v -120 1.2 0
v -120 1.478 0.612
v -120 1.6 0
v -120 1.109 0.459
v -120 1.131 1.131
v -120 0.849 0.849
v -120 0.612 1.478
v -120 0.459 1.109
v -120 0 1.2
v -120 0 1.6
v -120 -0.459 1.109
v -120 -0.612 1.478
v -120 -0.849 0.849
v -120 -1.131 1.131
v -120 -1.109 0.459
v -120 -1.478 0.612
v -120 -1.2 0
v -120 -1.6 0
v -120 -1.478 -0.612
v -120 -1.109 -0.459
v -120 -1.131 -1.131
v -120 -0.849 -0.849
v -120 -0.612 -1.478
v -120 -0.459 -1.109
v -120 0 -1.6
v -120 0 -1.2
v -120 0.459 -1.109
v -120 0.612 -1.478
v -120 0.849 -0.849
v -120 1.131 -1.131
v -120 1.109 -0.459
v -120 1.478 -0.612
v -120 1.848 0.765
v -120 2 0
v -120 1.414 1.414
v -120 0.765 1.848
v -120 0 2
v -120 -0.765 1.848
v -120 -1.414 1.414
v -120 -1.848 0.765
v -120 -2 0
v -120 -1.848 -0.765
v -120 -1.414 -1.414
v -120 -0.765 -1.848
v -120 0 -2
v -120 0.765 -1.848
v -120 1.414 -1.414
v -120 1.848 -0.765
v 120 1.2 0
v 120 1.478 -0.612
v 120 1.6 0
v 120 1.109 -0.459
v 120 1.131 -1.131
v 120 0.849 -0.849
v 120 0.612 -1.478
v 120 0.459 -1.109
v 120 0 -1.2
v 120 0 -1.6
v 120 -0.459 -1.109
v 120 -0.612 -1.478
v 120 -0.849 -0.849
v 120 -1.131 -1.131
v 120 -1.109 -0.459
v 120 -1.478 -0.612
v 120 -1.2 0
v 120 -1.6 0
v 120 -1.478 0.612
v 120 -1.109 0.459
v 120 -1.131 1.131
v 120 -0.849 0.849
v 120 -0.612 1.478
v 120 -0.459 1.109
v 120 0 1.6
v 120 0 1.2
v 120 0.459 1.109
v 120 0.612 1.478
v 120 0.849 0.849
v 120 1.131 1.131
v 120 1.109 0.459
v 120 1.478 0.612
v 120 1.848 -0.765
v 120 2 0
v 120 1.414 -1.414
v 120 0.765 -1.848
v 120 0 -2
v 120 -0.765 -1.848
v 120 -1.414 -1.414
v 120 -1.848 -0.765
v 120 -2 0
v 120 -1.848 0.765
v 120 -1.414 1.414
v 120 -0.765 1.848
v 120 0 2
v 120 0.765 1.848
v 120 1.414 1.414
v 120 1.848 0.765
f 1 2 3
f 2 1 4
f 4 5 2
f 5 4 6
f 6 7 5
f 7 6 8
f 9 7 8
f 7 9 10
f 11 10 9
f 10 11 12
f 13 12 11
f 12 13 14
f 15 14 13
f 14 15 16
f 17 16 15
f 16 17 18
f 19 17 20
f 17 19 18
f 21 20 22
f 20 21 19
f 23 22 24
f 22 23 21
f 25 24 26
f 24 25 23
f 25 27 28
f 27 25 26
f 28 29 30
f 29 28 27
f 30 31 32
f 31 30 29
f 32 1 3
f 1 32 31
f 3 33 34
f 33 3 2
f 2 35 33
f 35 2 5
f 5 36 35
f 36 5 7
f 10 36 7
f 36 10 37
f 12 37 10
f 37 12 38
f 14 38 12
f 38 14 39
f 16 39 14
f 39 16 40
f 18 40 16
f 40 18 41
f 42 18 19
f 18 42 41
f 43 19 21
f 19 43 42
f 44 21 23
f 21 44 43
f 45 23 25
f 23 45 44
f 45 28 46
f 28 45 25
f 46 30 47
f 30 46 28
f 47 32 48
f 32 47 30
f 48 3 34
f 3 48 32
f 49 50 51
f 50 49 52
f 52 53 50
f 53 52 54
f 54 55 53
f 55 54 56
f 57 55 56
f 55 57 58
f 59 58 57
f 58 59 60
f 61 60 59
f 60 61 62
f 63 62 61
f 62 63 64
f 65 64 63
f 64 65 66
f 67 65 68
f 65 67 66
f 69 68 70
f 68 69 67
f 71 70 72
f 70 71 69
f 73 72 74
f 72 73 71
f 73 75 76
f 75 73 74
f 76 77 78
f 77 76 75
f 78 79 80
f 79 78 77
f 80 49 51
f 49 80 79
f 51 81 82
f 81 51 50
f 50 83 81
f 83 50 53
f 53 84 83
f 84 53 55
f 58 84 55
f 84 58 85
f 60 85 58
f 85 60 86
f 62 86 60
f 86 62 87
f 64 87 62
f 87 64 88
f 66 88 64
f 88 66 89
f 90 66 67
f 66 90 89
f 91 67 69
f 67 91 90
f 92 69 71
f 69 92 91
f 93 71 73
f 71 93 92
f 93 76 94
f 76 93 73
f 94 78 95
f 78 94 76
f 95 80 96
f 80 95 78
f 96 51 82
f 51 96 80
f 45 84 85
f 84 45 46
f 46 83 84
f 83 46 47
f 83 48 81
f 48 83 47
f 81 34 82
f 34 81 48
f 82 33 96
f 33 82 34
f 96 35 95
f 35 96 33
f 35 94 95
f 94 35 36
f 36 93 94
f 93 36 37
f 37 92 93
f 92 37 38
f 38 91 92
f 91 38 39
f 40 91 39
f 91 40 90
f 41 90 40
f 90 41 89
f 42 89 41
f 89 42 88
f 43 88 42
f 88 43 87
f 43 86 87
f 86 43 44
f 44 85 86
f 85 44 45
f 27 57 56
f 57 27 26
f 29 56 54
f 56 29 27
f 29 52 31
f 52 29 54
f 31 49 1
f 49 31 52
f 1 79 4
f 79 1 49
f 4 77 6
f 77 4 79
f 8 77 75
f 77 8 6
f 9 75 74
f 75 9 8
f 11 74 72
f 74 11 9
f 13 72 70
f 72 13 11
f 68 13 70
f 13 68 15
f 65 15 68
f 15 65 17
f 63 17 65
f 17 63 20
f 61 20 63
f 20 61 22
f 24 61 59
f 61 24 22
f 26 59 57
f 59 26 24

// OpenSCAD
// file: ../p/4-4disc.scad
use <../lib.scad>
$fa=1; $fs=0.2;
function ldraw_lib__4_4disc(realsolid=false) = [
// 0 Disc 1.0
// 0 Name: 4-4disc.dat
// 0 Author: James Jessiman
// 0 !LDRAW_ORG Primitive UPDATE 2002-02
// 0 !LICENSE Licensed under CC BY 2.0 and CC BY 4.0 : see CAreadme.txt
// 
// 0 BFC CERTIFY CCW
  [0,"BFC","CERTIFY"],
  [0,"BFC","CCW"],
// 
// 0 !HISTORY 1998-12-15 [PTadmin] Official Update 1998-10
// 0 !HISTORY 2002-03-23 [sbliss] Added BFC statement
// 0 !HISTORY 2002-04-25 [PTadmin] Official Update 2002-02
// 0 !HISTORY 2007-06-24 [PTadmin] Header formatted for Contributor Agreement
// 0 !HISTORY 2008-07-01 [PTadmin] Official Update 2008-01
// 
// 
// 3 16 0 0 0 1 0 0 0.9239 0 0.3827
  [3,16,0,0,0,1,0,0,0.9239,0,0.3827],
// 3 16 0 0 0 0.9239 0 0.3827 0.7071 0 0.7071
  [3,16,0,0,0,0.9239,0,0.3827,0.7071,0,0.7071],
// 3 16 0 0 0 0.7071 0 0.7071 0.3827 0 0.9239
  [3,16,0,0,0,0.7071,0,0.7071,0.3827,0,0.9239],
// 3 16 0 0 0 0.3827 0 0.9239 0 0 1
  [3,16,0,0,0,0.3827,0,0.9239,0,0,1],
// 3 16 0 0 0 0 0 1 -0.3827 0 0.9239
  [3,16,0,0,0,0,0,1,-0.3827,0,0.9239],
// 3 16 0 0 0 -0.3827 0 0.9239 -0.7071 0 0.7071
  [3,16,0,0,0,-0.3827,0,0.9239,-0.7071,0,0.7071],
// 3 16 0 0 0 -0.7071 0 0.7071 -0.9239 0 0.3827
  [3,16,0,0,0,-0.7071,0,0.7071,-0.9239,0,0.3827],
// 3 16 0 0 0 -0.9239 0 0.3827 -1 0 -0
  [3,16,0,0,0,-0.9239,0,0.3827,-1,0,-0],
// 3 16 0 0 0 -1 0 -0 -0.9239 0 -0.3827
  [3,16,0,0,0,-1,0,-0,-0.9239,0,-0.3827],
// 3 16 0 0 0 -0.9239 0 -0.3827 -0.7071 0 -0.7071
  [3,16,0,0,0,-0.9239,0,-0.3827,-0.7071,0,-0.7071],
// 3 16 0 0 0 -0.7071 0 -0.7071 -0.3827 0 -0.9239
  [3,16,0,0,0,-0.7071,0,-0.7071,-0.3827,0,-0.9239],
// 3 16 0 0 0 -0.3827 0 -0.9239 0 0 -1
  [3,16,0,0,0,-0.3827,0,-0.9239,0,0,-1],
// 3 16 0 0 0 0 0 -1 0.3827 0 -0.9239
  [3,16,0,0,0,0,0,-1,0.3827,0,-0.9239],
// 3 16 0 0 0 0.3827 0 -0.9239 0.7071 0 -0.7071
  [3,16,0,0,0,0.3827,0,-0.9239,0.7071,0,-0.7071],
// 3 16 0 0 0 0.7071 0 -0.7071 0.9239 0 -0.3827
  [3,16,0,0,0,0.7071,0,-0.7071,0.9239,0,-0.3827],
// 3 16 0 0 0 0.9239 0 -0.3827 1 0 0
  [3,16,0,0,0,0.9239,0,-0.3827,1,0,0],
// 0
];
module ldraw_lib__4_4disc(step=0, col=false, unit=2/5, alt=false, line=0.2, solid=!$preview)
    makepoly(ldraw_lib__4_4disc(solid), step=step, col=col, unit=unit, alt=alt, line=line, solid=solid);
ldraw_lib__4_4disc(line=0.2);
// file: ../p/stud3.scad
use <../lib.scad>
use <4-4cyli.scad>
use <4-4disc.scad>
use <4-4edge.scad>
$fa=1; $fs=0.2;
function ldraw_lib__stud3(realsolid=false) = realsolid ? 
    [openscad(translate([0,0,-eps()], o=cylinder(4+eps(), r=4)),2)] : [
// 0 Stud Tube Solid
// 0 Name: stud3.dat
// 0 Author: James Jessiman
// 0 !LDRAW_ORG Primitive UPDATE 2012-01
// 0 !LICENSE Licensed under CC BY 2.0 and CC BY 4.0 : see CAreadme.txt
// 
// 0 BFC CERTIFY CCW
  [0,"BFC","CERTIFY"],
  [0,"BFC","CCW"],
// 
// 0 !HISTORY 2002-04-04 [sbliss] Modified for BFC compliance
// 0 !HISTORY 2002-04-25 [PTadmin] Official Update 2002-02
// 0 !HISTORY 2007-06-24 [PTadmin] Header formatted for Contributor Agreement
// 0 !HISTORY 2008-07-01 [PTadmin] Official Update 2008-01
// 0 !HISTORY 2012-02-16 [Philo] Changed to CCW
// 0 !HISTORY 2012-03-30 [PTadmin] Official Update 2012-01
// 
// 
// 1 16 0 -4 0 4 0 0 0 1 0 0 0 4 4-4edge.dat
  [1,16,0,-4,0,4,0,0,0,1,0,0,0,4, ldraw_lib__4_4edge(realsolid)],
// 1 16 0 0 0 4 0 0 0 1 0 0 0 4 4-4edge.dat
  [1,16,0,0,0,4,0,0,0,1,0,0,0,4, ldraw_lib__4_4edge(realsolid)],
// 1 16 0 -4 0 4 0 0 0 1 0 0 0 4 4-4disc.dat
  [1,16,0,-4,0,4,0,0,0,1,0,0,0,4, ldraw_lib__4_4disc(realsolid)],
// 1 16 0 -4 0 4 0 0 0 4 0 0 0 4 4-4cyli.dat
  [1,16,0,-4,0,4,0,0,0,4,0,0,0,4, ldraw_lib__4_4cyli(realsolid)],
];
module ldraw_lib__stud3(step=0, col=false, unit=2/5, alt=false, line=0.2, solid=!$preview)
    makepoly(ldraw_lib__stud3(solid), step=step, col=col, unit=unit, alt=alt, line=line, solid=solid);
ldraw_lib__stud3(line=0.2);
// file: ../p/stud.scad
use <../lib.scad>
use <4-4cyli.scad>
use <4-4disc.scad>
use <4-4edge.scad>
$fa=1; $fs=0.2;
function ldraw_lib__stud(realsolid=false) = realsolid ? 
    [openscad(translate([0,0,-eps()], o=cylinder(4+eps(), r=6)),2)] : [
// 0 Stud
// 0 Name: stud.dat
// 0 Author: James Jessiman
// 0 !LDRAW_ORG Primitive UPDATE 2012-01
// 0 !LICENSE Licensed under CC BY 2.0 and CC BY 4.0 : see CAreadme.txt
// 
// 0 BFC CERTIFY CCW
  [0,"BFC","CERTIFY"],
  [0,"BFC","CCW"],
// 
// 0 !HISTORY 2002-04-04 [sbliss] Modified for BFC compliance
// 0 !HISTORY 2002-04-25 [PTadmin] Official Update 2002-02
// 0 !HISTORY 2007-06-24 [PTadmin] Header formatted for Contributor Agreement
// 0 !HISTORY 2008-07-01 [PTadmin] Official Update 2008-01
// 0 !HISTORY 2012-02-16 [Philo] Changed to CCW
// 0 !HISTORY 2012-03-30 [PTadmin] Official Update 2012-01
// 
// 
// 1 16 0 0 0 6 0 0 0 1 0 0 0 6 4-4edge.dat
  [1,16,0,0,0,6,0,0,0,1,0,0,0,6, ldraw_lib__4_4edge(realsolid)],
// 1 16 0 -4 0 6 0 0 0 1 0 0 0 6 4-4edge.dat
  [1,16,0,-4,0,6,0,0,0,1,0,0,0,6, ldraw_lib__4_4edge(realsolid)],
// 1 16 0 0 0 6 0 0 0 -4 0 0 0 6 4-4cyli.dat
  [1,16,0,0,0,6,0,0,0,-4,0,0,0,6, ldraw_lib__4_4cyli(realsolid)],
// 1 16 0 -4 0 6 0 0 0 1 0 0 0 6 4-4disc.dat
  [1,16,0,-4,0,6,0,0,0,1,0,0,0,6, ldraw_lib__4_4disc(realsolid)],
];
module ldraw_lib__stud(step=0, col=false, unit=2/5, alt=false, line=0.2, solid=!$preview)
    makepoly(ldraw_lib__stud(solid), step=step, col=col, unit=unit, alt=alt, line=line, solid=solid);
ldraw_lib__stud(line=0.2);
// file: ../p/box5.scad
use <../lib.scad>
$fa=1; $fs=0.2;
function ldraw_lib__box5(realsolid=false) = [
// 0 Box with 5 Faces and All Edges
// 0 Name: box5.dat
// 0 Author: James Jessiman
// 0 !LDRAW_ORG Primitive UPDATE 2012-01
// 0 !LICENSE Licensed under CC BY 2.0 and CC BY 4.0 : see CAreadme.txt
// 
// 0 BFC CERTIFY CCW
  [0,"BFC","CERTIFY"],
  [0,"BFC","CCW"],
// 
// 0 !HISTORY 2002-04-03 [sbliss] Modified for BFC compliance
// 0 !HISTORY 2002-04-25 [PTadmin] Official Update 2002-02
// 0 !HISTORY 2007-06-24 [PTadmin] Header formatted for Contributor Agreement
// 0 !HISTORY 2008-07-01 [PTadmin] Official Update 2008-01
// 0 !HISTORY 2012-02-16 [Philo] Changed to CCW
// 0 !HISTORY 2012-03-30 [PTadmin] Official Update 2012-01
// 
// 
// 2 24 1 1 1 -1 1 1
  [2,24,1,1,1,-1,1,1],
// 2 24 -1 1 1 -1 1 -1
  [2,24,-1,1,1,-1,1,-1],
// 2 24 -1 1 -1 1 1 -1
  [2,24,-1,1,-1,1,1,-1],
// 2 24 1 1 -1 1 1 1
  [2,24,1,1,-1,1,1,1],
// 2 24 1 0 1 -1 0 1
  [2,24,1,0,1,-1,0,1],
// 2 24 -1 0 1 -1 0 -1
  [2,24,-1,0,1,-1,0,-1],
// 2 24 -1 0 -1 1 0 -1
  [2,24,-1,0,-1,1,0,-1],
// 2 24 1 0 -1 1 0 1
  [2,24,1,0,-1,1,0,1],
// 2 24 1 0 1 1 1 1
  [2,24,1,0,1,1,1,1],
// 2 24 -1 0 1 -1 1 1
  [2,24,-1,0,1,-1,1,1],
// 2 24 1 0 -1 1 1 -1
  [2,24,1,0,-1,1,1,-1],
// 2 24 -1 0 -1 -1 1 -1
  [2,24,-1,0,-1,-1,1,-1],
// 4 16 -1 1 1 1 1 1 1 1 -1 -1 1 -1
  [4,16,-1,1,1,1,1,1,1,1,-1,-1,1,-1],
// 4 16 -1 1 1 -1 0 1 1 0 1 1 1 1
  [4,16,-1,1,1,-1,0,1,1,0,1,1,1,1],
// 4 16 -1 1 -1 -1 0 -1 -1 0 1 -1 1 1
  [4,16,-1,1,-1,-1,0,-1,-1,0,1,-1,1,1],
// 4 16 1 1 -1 1 0 -1 -1 0 -1 -1 1 -1
  [4,16,1,1,-1,1,0,-1,-1,0,-1,-1,1,-1],
// 4 16 1 1 1 1 0 1 1 0 -1 1 1 -1
  [4,16,1,1,1,1,0,1,1,0,-1,1,1,-1],
];
module ldraw_lib__box5(step=0, col=false, unit=2/5, alt=false, line=0.2, solid=!$preview)
    makepoly(ldraw_lib__box5(solid), step=step, col=col, unit=unit, alt=alt, line=line, solid=solid);
ldraw_lib__box5(line=0.2);
// file: ../p/box4t.scad
use <../lib.scad>
$fa=1; $fs=0.2;
function ldraw_lib__box4t(realsolid=false) = [
// 0 Box with 4 Adjacent Faces and All Edges
// 0 Name: box4t.dat
// 0 Author: Tore Eriksson [Tore_Eriksson]
// 0 !LDRAW_ORG Primitive UPDATE 2003-02
// 0 !LICENSE Licensed under CC BY 2.0 and CC BY 4.0 : see CAreadme.txt
// 
// 0 BFC CERTIFY CCW
  [0,"BFC","CERTIFY"],
  [0,"BFC","CCW"],
// 
// 0 !HISTORY 1997-09-29 [PTadmin] Official Update 1997-15
// 0 !HISTORY 2002-08-31 [izanette] Modified with WINDZ for BFC compliance
// 0 !HISTORY 2003-08-01 [PTadmin] Official Update 2003-02
// 0 !HISTORY 2007-06-24 [PTadmin] Header formatted for Contributor Agreement
// 0 !HISTORY 2008-07-01 [PTadmin] Official Update 2008-01
// 
// 
// 2 24 1 1 1 -1 1 1
  [2,24,1,1,1,-1,1,1],
// 2 24 -1 1 1 -1 1 -1
  [2,24,-1,1,1,-1,1,-1],
// 2 24 -1 1 -1 1 1 -1
  [2,24,-1,1,-1,1,1,-1],
// 2 24 1 1 -1 1 1 1
  [2,24,1,1,-1,1,1,1],
// 2 24 1 0 1 -1 0 1
  [2,24,1,0,1,-1,0,1],
// 2 24 -1 0 1 -1 0 -1
  [2,24,-1,0,1,-1,0,-1],
// 2 24 -1 0 -1 1 0 -1
  [2,24,-1,0,-1,1,0,-1],
// 2 24 1 0 -1 1 0 1
  [2,24,1,0,-1,1,0,1],
// 2 24 1 0 1 1 1 1
  [2,24,1,0,1,1,1,1],
// 2 24 -1 0 1 -1 1 1
  [2,24,-1,0,1,-1,1,1],
// 2 24 1 0 -1 1 1 -1
  [2,24,1,0,-1,1,1,-1],
// 2 24 -1 0 -1 -1 1 -1
  [2,24,-1,0,-1,-1,1,-1],
// 4 16 1 1 1 1 1 -1 -1 1 -1 -1 1 1
  [4,16,1,1,1,1,1,-1,-1,1,-1,-1,1,1],
// 4 16 1 1 1 -1 1 1 -1 0 1 1 0 1
  [4,16,1,1,1,-1,1,1,-1,0,1,1,0,1],
// 4 16 -1 1 1 -1 1 -1 -1 0 -1 -1 0 1
  [4,16,-1,1,1,-1,1,-1,-1,0,-1,-1,0,1],
// 0 4 16 -1 1 -1 -1 0 -1 1 0 -1 1 1 -1
// 4 16 1 1 -1 1 1 1 1 0 1 1 0 -1
  [4,16,1,1,-1,1,1,1,1,0,1,1,0,-1],
// 0
];
module ldraw_lib__box4t(step=0, col=false, unit=2/5, alt=false, line=0.2, solid=!$preview)
    makepoly(ldraw_lib__box4t(solid), step=step, col=col, unit=unit, alt=alt, line=line, solid=solid);
ldraw_lib__box4t(line=0.2);
// file: s/3004s01.scad
use <../../lib.scad>
use <../../p/box4t.scad>
use <../../p/box5.scad>
use <../../p/stud.scad>
use <../../p/stud3.scad>
$fa=1; $fs=0.2;
function ldraw_lib__s__3004s01(realsolid=false) = [
// 0 ~Brick  1 x  2 without Front Face
// 0 Name: s\3004s01.dat
// 0 Author: James Jessiman
// 0 !LDRAW_ORG Subpart UPDATE 2003-03
// 0 !LICENSE Licensed under CC BY 2.0 and CC BY 4.0 : see CAreadme.txt
// 
// 0 BFC CERTIFY CCW
  [0,"BFC","CERTIFY"],
  [0,"BFC","CCW"],
// 
// 0 !HISTORY 2003-09-07 [jriley] Subfiling, BFC
// 0 !HISTORY 2003-12-19 [PTadmin] Official Update 2003-03
// 0 !HISTORY 2007-08-29 [PTadmin] Header formatted for Contributor Agreement
// 0 !HISTORY 2008-07-01 [PTadmin] Official Update 2008-01
// 
// 
// 1 16 0 4 0 1 0 0 0 -5 0 0 0 1 stud3.dat
  [1,16,0,4,0,1,0,0,0,-5,0,0,0,1, ldraw_lib__stud3(realsolid)],
// 0 BFC INVERTNEXT
  [0,"BFC","INVERTNEXT"],
// 1 16 0 24 0 16 0 0 0 -20 0 0 0 6 box5.dat
  [1,16,0,24,0,16,0,0,0,-20,0,0,0,6, ldraw_lib__box5(realsolid)],
// 4 16 20 24 10 16 24 6 -16 24 6 -20 24 10
  [4,16,20,24,10,16,24,6,-16,24,6,-20,24,10],
// 4 16 -20 24 10 -16 24 6 -16 24 -6 -20 24 -10
  [4,16,-20,24,10,-16,24,6,-16,24,-6,-20,24,-10],
// 4 16 -20 24 -10 -16 24 -6 16 24 -6 20 24 -10
  [4,16,-20,24,-10,-16,24,-6,16,24,-6,20,24,-10],
// 4 16 20 24 -10 16 24 -6 16 24 6 20 24 10
  [4,16,20,24,-10,16,24,-6,16,24,6,20,24,10],
// 1 16 0 24 0 20 0 0 0 -24 0 0 0 10 box4t.dat
  [1,16,0,24,0,20,0,0,0,-24,0,0,0,10, ldraw_lib__box4t(realsolid)],
// 1 16 10 0 0 1 0 0 0 1 0 0 0 1 stud.dat
  [1,16,10,0,0,1,0,0,0,1,0,0,0,1, ldraw_lib__stud(realsolid)],
// 1 16 -10 0 0 1 0 0 0 1 0 0 0 1 stud.dat
  [1,16,-10,0,0,1,0,0,0,1,0,0,0,1, ldraw_lib__stud(realsolid)],
// 0
];
module ldraw_lib__s__3004s01(step=0, col=false, unit=2/5, alt=false, line=0.2, solid=!$preview)
    makepoly(ldraw_lib__s__3004s01(solid), step=step, col=col, unit=unit, alt=alt, line=line, solid=solid);
ldraw_lib__s__3004s01(line=0.2);
// file: ../p/4-4cyli.scad
use <../lib.scad>
$fa=1; $fs=0.2;
function ldraw_lib__4_4cyli(realsolid=false) = [
// 0 Cylinder 1.0
// 0 Name: 4-4cyli.dat
// 0 Author: James Jessiman
// 0 !LDRAW_ORG Primitive UPDATE 2005-01
// 0 !LICENSE Licensed under CC BY 2.0 and CC BY 4.0 : see CAreadme.txt
// 
// 0 BFC CERTIFY CCW
  [0,"BFC","CERTIFY"],
  [0,"BFC","CCW"],
// 
// 0 !HISTORY 1998-12-15 [PTadmin] Official Update 1998-10
// 0 !HISTORY 2002-03-23 [sbliss] Added BFC statement; merged headers from files in distributions LDraw 0.27 and Complete.
// 0 !HISTORY 2002-04-25 [PTadmin] Official Update 2002-02
// 0 !HISTORY 2004-12-14 [guyvivan] BFC CCW
// 0 !HISTORY 2005-12-28 [PTadmin] Official Update 2005-01
// 0 !HISTORY 2007-06-24 [PTadmin] Header formatted for Contributor Agreement
// 0 !HISTORY 2008-07-01 [PTadmin] Official Update 2008-01
// 
// 
// 4 16 1 1 0 0.9239 1 0.3827 0.9239 0 0.3827 1 0 0
  [4,16,1,1,0,0.9239,1,0.3827,0.9239,0,0.3827,1,0,0],
// 5 24 1 0 0 1 1 0 0.9239 0 0.3827 0.9239 0 -0.3827
  [5,24,1,0,0,1,1,0,0.9239,0,0.3827,0.9239,0,-0.3827],
// 4 16 0.9239 1 0.3827 0.7071 1 0.7071 0.7071 0 0.7071 0.9239 0 0.3827
  [4,16,0.9239,1,0.3827,0.7071,1,0.7071,0.7071,0,0.7071,0.9239,0,0.3827],
// 5 24 0.9239 0 0.3827 0.9239 1 0.3827 0.7071 0 0.7071 1 0 0
  [5,24,0.9239,0,0.3827,0.9239,1,0.3827,0.7071,0,0.7071,1,0,0],
// 4 16 0.7071 1 0.7071 0.3827 1 0.9239 0.3827 0 0.9239 0.7071 0 0.7071
  [4,16,0.7071,1,0.7071,0.3827,1,0.9239,0.3827,0,0.9239,0.7071,0,0.7071],
// 5 24 0.7071 0 0.7071 0.7071 1 0.7071 0.3827 0 0.9239 0.9239 0 0.3827
  [5,24,0.7071,0,0.7071,0.7071,1,0.7071,0.3827,0,0.9239,0.9239,0,0.3827],
// 4 16 0.3827 1 0.9239 0 1 1 0 0 1 0.3827 0 0.9239
  [4,16,0.3827,1,0.9239,0,1,1,0,0,1,0.3827,0,0.9239],
// 5 24 0.3827 0 0.9239 0.3827 1 0.9239 0 0 1 0.7071 0 0.7071
  [5,24,0.3827,0,0.9239,0.3827,1,0.9239,0,0,1,0.7071,0,0.7071],
// 4 16 0 1 1 -0.3827 1 0.9239 -0.3827 0 0.9239 0 0 1
  [4,16,0,1,1,-0.3827,1,0.9239,-0.3827,0,0.9239,0,0,1],
// 5 24 0 0 1 0 1 1 -0.3827 0 0.9239 0.3827 0 0.9239
  [5,24,0,0,1,0,1,1,-0.3827,0,0.9239,0.3827,0,0.9239],
// 4 16 -0.3827 1 0.9239 -0.7071 1 0.7071 -0.7071 0 0.7071 -0.3827 0 0.9239
  [4,16,-0.3827,1,0.9239,-0.7071,1,0.7071,-0.7071,0,0.7071,-0.3827,0,0.9239],
// 5 24 -0.3827 0 0.9239 -0.3827 1 0.9239 -0.7071 0 0.7071 0 0 1
  [5,24,-0.3827,0,0.9239,-0.3827,1,0.9239,-0.7071,0,0.7071,0,0,1],
// 4 16 -0.7071 1 0.7071 -0.9239 1 0.3827 -0.9239 0 0.3827 -0.7071 0 0.7071
  [4,16,-0.7071,1,0.7071,-0.9239,1,0.3827,-0.9239,0,0.3827,-0.7071,0,0.7071],
// 5 24 -0.7071 0 0.7071 -0.7071 1 0.7071 -0.9239 0 0.3827 -0.3827 0 0.9239
  [5,24,-0.7071,0,0.7071,-0.7071,1,0.7071,-0.9239,0,0.3827,-0.3827,0,0.9239],
// 4 16 -0.9239 1 0.3827 -1 1 0 -1 0 0 -0.9239 0 0.3827
  [4,16,-0.9239,1,0.3827,-1,1,0,-1,0,0,-0.9239,0,0.3827],
// 5 24 -0.9239 0 0.3827 -0.9239 1 0.3827 -1 0 0 -0.7071 0 0.7071
  [5,24,-0.9239,0,0.3827,-0.9239,1,0.3827,-1,0,0,-0.7071,0,0.7071],
// 4 16 -1 1 0 -0.9239 1 -0.3827 -0.9239 0 -0.3827 -1 0 0
  [4,16,-1,1,0,-0.9239,1,-0.3827,-0.9239,0,-0.3827,-1,0,0],
// 5 24 -1 0 0 -1 1 0 -0.9239 0 -0.3827 -0.9239 0 0.3827
  [5,24,-1,0,0,-1,1,0,-0.9239,0,-0.3827,-0.9239,0,0.3827],
// 4 16 -0.9239 1 -0.3827 -0.7071 1 -0.7071 -0.7071 0 -0.7071 -0.9239 0 -0.3827
  [4,16,-0.9239,1,-0.3827,-0.7071,1,-0.7071,-0.7071,0,-0.7071,-0.9239,0,-0.3827],
// 5 24 -0.9239 0 -0.3827 -0.9239 1 -0.3827 -0.7071 0 -0.7071 -1 0 0
  [5,24,-0.9239,0,-0.3827,-0.9239,1,-0.3827,-0.7071,0,-0.7071,-1,0,0],
// 4 16 -0.7071 1 -0.7071 -0.3827 1 -0.9239 -0.3827 0 -0.9239 -0.7071 0 -0.7071
  [4,16,-0.7071,1,-0.7071,-0.3827,1,-0.9239,-0.3827,0,-0.9239,-0.7071,0,-0.7071],
// 5 24 -0.7071 0 -0.7071 -0.7071 1 -0.7071 -0.3827 0 -0.9239 -0.9239 0 -0.3827
  [5,24,-0.7071,0,-0.7071,-0.7071,1,-0.7071,-0.3827,0,-0.9239,-0.9239,0,-0.3827],
// 4 16 -0.3827 1 -0.9239 0 1 -1 0 0 -1 -0.3827 0 -0.9239
  [4,16,-0.3827,1,-0.9239,0,1,-1,0,0,-1,-0.3827,0,-0.9239],
// 5 24 -0.3827 0 -0.9239 -0.3827 1 -0.9239 0 0 -1 -0.7071 0 -0.7071
  [5,24,-0.3827,0,-0.9239,-0.3827,1,-0.9239,0,0,-1,-0.7071,0,-0.7071],
// 4 16 0 1 -1 0.3827 1 -0.9239 0.3827 0 -0.9239 0 0 -1
  [4,16,0,1,-1,0.3827,1,-0.9239,0.3827,0,-0.9239,0,0,-1],
// 5 24 0 0 -1 0 1 -1 0.3827 0 -0.9239 -0.3827 0 -0.9239
  [5,24,0,0,-1,0,1,-1,0.3827,0,-0.9239,-0.3827,0,-0.9239],
// 4 16 0.3827 1 -0.9239 0.7071 1 -0.7071 0.7071 0 -0.7071 0.3827 0 -0.9239
  [4,16,0.3827,1,-0.9239,0.7071,1,-0.7071,0.7071,0,-0.7071,0.3827,0,-0.9239],
// 5 24 0.3827 0 -0.9239 0.3827 1 -0.9239 0.7071 0 -0.7071 0 0 -1
  [5,24,0.3827,0,-0.9239,0.3827,1,-0.9239,0.7071,0,-0.7071,0,0,-1],
// 4 16 0.7071 1 -0.7071 0.9239 1 -0.3827 0.9239 0 -0.3827 0.7071 0 -0.7071
  [4,16,0.7071,1,-0.7071,0.9239,1,-0.3827,0.9239,0,-0.3827,0.7071,0,-0.7071],
// 5 24 0.7071 0 -0.7071 0.7071 1 -0.7071 0.9239 0 -0.3827 0.3827 0 -0.9239
  [5,24,0.7071,0,-0.7071,0.7071,1,-0.7071,0.9239,0,-0.3827,0.3827,0,-0.9239],
// 4 16 0.9239 1 -0.3827 1 1 0 1 0 0 0.9239 0 -0.3827
  [4,16,0.9239,1,-0.3827,1,1,0,1,0,0,0.9239,0,-0.3827],
// 5 24 0.9239 0 -0.3827 0.9239 1 -0.3827 1 0 0 0.7071 0 -0.7071
  [5,24,0.9239,0,-0.3827,0.9239,1,-0.3827,1,0,0,0.7071,0,-0.7071],
// 0
];
module ldraw_lib__4_4cyli(step=0, col=false, unit=2/5, alt=false, line=0.2, solid=!$preview)
    makepoly(ldraw_lib__4_4cyli(solid), step=step, col=col, unit=unit, alt=alt, line=line, solid=solid);
ldraw_lib__4_4cyli(line=0.2);
// file: ../p/4-4ring4.scad
use <../lib.scad>
$fa=1; $fs=0.2;
function ldraw_lib__4_4ring4(realsolid=false) = [
// 0 Ring  4 x 1.0
// 0 Name: 4-4ring4.dat
// 0 Author: James Jessiman
// 0 !LDRAW_ORG Primitive UPDATE 2009-01
// 0 !LICENSE Licensed under CC BY 2.0 and CC BY 4.0 : see CAreadme.txt
// 
// 0 BFC CERTIFY CCW
  [0,"BFC","CERTIFY"],
  [0,"BFC","CCW"],
// 
// 0 !HISTORY 1998-12-15 [PTadmin] Official Update 1998-10
// 0 !HISTORY 2002-04-08 [BrickCaster] Modified for BFC compliance
// 0 !HISTORY 2002-04-25 [PTadmin] Official Update 2002-02
// 0 !HISTORY 2007-06-24 [PTadmin] Header formatted for Contributor Agreement
// 0 !HISTORY 2008-07-01 [PTadmin] Official Update 2008-01
// 0 !HISTORY 2008-08-26 [cwdee] Switch polygon winding and rename
// 0 !HISTORY 2009-05-02 [PTadmin] Official Update 2009-01
// 
// 
// 4 16 -1.9135 0 4.6195 -1.5308 0 3.6956 0 0 4 0 0 5
  [4,16,-1.9135,0,4.6195,-1.5308,0,3.6956,0,0,4,0,0,5],
// 4 16 -3.5355 0 3.5355 -2.8284 0 2.8284 -1.5308 0 3.6956 -1.9135 0 4.6195
  [4,16,-3.5355,0,3.5355,-2.8284,0,2.8284,-1.5308,0,3.6956,-1.9135,0,4.6195],
// 4 16 -4.6195 0 1.9135 -3.6956 0 1.5308 -2.8284 0 2.8284 -3.5355 0 3.5355
  [4,16,-4.6195,0,1.9135,-3.6956,0,1.5308,-2.8284,0,2.8284,-3.5355,0,3.5355],
// 4 16 -5 0 0 -4 0 0 -3.6956 0 1.5308 -4.6195 0 1.9135
  [4,16,-5,0,0,-4,0,0,-3.6956,0,1.5308,-4.6195,0,1.9135],
// 4 16 -4.6195 0 -1.9135 -3.6956 0 -1.5308 -4 0 0 -5 0 0
  [4,16,-4.6195,0,-1.9135,-3.6956,0,-1.5308,-4,0,0,-5,0,0],
// 4 16 -3.5355 0 -3.5355 -2.8284 0 -2.8284 -3.6956 0 -1.5308 -4.6195 0 -1.9135
  [4,16,-3.5355,0,-3.5355,-2.8284,0,-2.8284,-3.6956,0,-1.5308,-4.6195,0,-1.9135],
// 4 16 -1.9135 0 -4.6195 -1.5308 0 -3.6956 -2.8284 0 -2.8284 -3.5355 0 -3.5355
  [4,16,-1.9135,0,-4.6195,-1.5308,0,-3.6956,-2.8284,0,-2.8284,-3.5355,0,-3.5355],
// 4 16 0 0 -5 0 0 -4 -1.5308 0 -3.6956 -1.9135 0 -4.6195
  [4,16,0,0,-5,0,0,-4,-1.5308,0,-3.6956,-1.9135,0,-4.6195],
// 4 16 1.9135 0 -4.6195 1.5308 0 -3.6956 0 0 -4 0 0 -5
  [4,16,1.9135,0,-4.6195,1.5308,0,-3.6956,0,0,-4,0,0,-5],
// 4 16 3.5355 0 -3.5355 2.8284 0 -2.8284 1.5308 0 -3.6956 1.9135 0 -4.6195
  [4,16,3.5355,0,-3.5355,2.8284,0,-2.8284,1.5308,0,-3.6956,1.9135,0,-4.6195],
// 4 16 4.6195 0 -1.9135 3.6956 0 -1.5308 2.8284 0 -2.8284 3.5355 0 -3.5355
  [4,16,4.6195,0,-1.9135,3.6956,0,-1.5308,2.8284,0,-2.8284,3.5355,0,-3.5355],
// 4 16 5 0 0 4 0 0 3.6956 0 -1.5308 4.6195 0 -1.9135
  [4,16,5,0,0,4,0,0,3.6956,0,-1.5308,4.6195,0,-1.9135],
// 4 16 4.6195 0 1.9135 3.6956 0 1.5308 4 0 0 5 0 0
  [4,16,4.6195,0,1.9135,3.6956,0,1.5308,4,0,0,5,0,0],
// 4 16 3.5355 0 3.5355 2.8284 0 2.8284 3.6956 0 1.5308 4.6195 0 1.9135
  [4,16,3.5355,0,3.5355,2.8284,0,2.8284,3.6956,0,1.5308,4.6195,0,1.9135],
// 4 16 1.9135 0 4.6195 1.5308 0 3.6956 2.8284 0 2.8284 3.5355 0 3.5355
  [4,16,1.9135,0,4.6195,1.5308,0,3.6956,2.8284,0,2.8284,3.5355,0,3.5355],
// 4 16 0 0 5 0 0 4 1.5308 0 3.6956 1.9135 0 4.6195
  [4,16,0,0,5,0,0,4,1.5308,0,3.6956,1.9135,0,4.6195],
// 0
];
module ldraw_lib__4_4ring4(step=0, col=false, unit=2/5, alt=false, line=0.2, solid=!$preview)
    makepoly(ldraw_lib__4_4ring4(solid), step=step, col=col, unit=unit, alt=alt, line=line, solid=solid);
ldraw_lib__4_4ring4(line=0.2);
// file: ../p/4-4ring3.scad
use <../lib.scad>
$fa=1; $fs=0.2;
function ldraw_lib__4_4ring3(realsolid=false) = [
// 0 Ring  3 x 1.0
// 0 Name: 4-4ring3.dat
// 0 Author: James Jessiman
// 0 !LDRAW_ORG Primitive UPDATE 2009-01
// 0 !LICENSE Licensed under CC BY 2.0 and CC BY 4.0 : see CAreadme.txt
// 
// 0 BFC CERTIFY CCW
  [0,"BFC","CERTIFY"],
  [0,"BFC","CCW"],
// 
// 0 !HISTORY 1998-12-15 [PTadmin] Official Update 1998-10
// 0 !HISTORY 2002-04-05 [hafhead] Added BFC statement
// 0 !HISTORY 2002-04-25 [PTadmin] Official Update 2002-02
// 0 !HISTORY 2007-06-24 [PTadmin] Header formatted for Contributor Agreement
// 0 !HISTORY 2008-07-01 [PTadmin] Official Update 2008-01
// 0 !HISTORY 2008-08-26 [cwdee] Switch polygon winding and rename
// 0 !HISTORY 2009-05-02 [PTadmin] Official Update 2009-01
// 
// 
// 4 16 -1.5308 0 3.6956 -1.1481 0 2.7717 0 0 3 0 0 4
  [4,16,-1.5308,0,3.6956,-1.1481,0,2.7717,0,0,3,0,0,4],
// 4 16 -2.8284 0 2.8284 -2.1213 0 2.1213 -1.1481 0 2.7717 -1.5308 0 3.6956
  [4,16,-2.8284,0,2.8284,-2.1213,0,2.1213,-1.1481,0,2.7717,-1.5308,0,3.6956],
// 4 16 -3.6956 0 1.5308 -2.7717 0 1.1481 -2.1213 0 2.1213 -2.8284 0 2.8284
  [4,16,-3.6956,0,1.5308,-2.7717,0,1.1481,-2.1213,0,2.1213,-2.8284,0,2.8284],
// 4 16 -4 0 0 -3 0 0 -2.7717 0 1.1481 -3.6956 0 1.5308
  [4,16,-4,0,0,-3,0,0,-2.7717,0,1.1481,-3.6956,0,1.5308],
// 4 16 -3.6956 0 -1.5308 -2.7717 0 -1.1481 -3 0 0 -4 0 0
  [4,16,-3.6956,0,-1.5308,-2.7717,0,-1.1481,-3,0,0,-4,0,0],
// 4 16 -2.8284 0 -2.8284 -2.1213 0 -2.1213 -2.7717 0 -1.1481 -3.6956 0 -1.5308
  [4,16,-2.8284,0,-2.8284,-2.1213,0,-2.1213,-2.7717,0,-1.1481,-3.6956,0,-1.5308],
// 4 16 -1.5308 0 -3.6956 -1.1481 0 -2.7717 -2.1213 0 -2.1213 -2.8284 0 -2.8284
  [4,16,-1.5308,0,-3.6956,-1.1481,0,-2.7717,-2.1213,0,-2.1213,-2.8284,0,-2.8284],
// 4 16 0 0 -4 0 0 -3 -1.1481 0 -2.7717 -1.5308 0 -3.6956
  [4,16,0,0,-4,0,0,-3,-1.1481,0,-2.7717,-1.5308,0,-3.6956],
// 4 16 1.5308 0 -3.6956 1.1481 0 -2.7717 0 0 -3 0 0 -4
  [4,16,1.5308,0,-3.6956,1.1481,0,-2.7717,0,0,-3,0,0,-4],
// 4 16 2.8284 0 -2.8284 2.1213 0 -2.1213 1.1481 0 -2.7717 1.5308 0 -3.6956
  [4,16,2.8284,0,-2.8284,2.1213,0,-2.1213,1.1481,0,-2.7717,1.5308,0,-3.6956],
// 4 16 3.6956 0 -1.5308 2.7717 0 -1.1481 2.1213 0 -2.1213 2.8284 0 -2.8284
  [4,16,3.6956,0,-1.5308,2.7717,0,-1.1481,2.1213,0,-2.1213,2.8284,0,-2.8284],
// 4 16 4 0 0 3 0 0 2.7717 0 -1.1481 3.6956 0 -1.5308
  [4,16,4,0,0,3,0,0,2.7717,0,-1.1481,3.6956,0,-1.5308],
// 4 16 3.6956 0 1.5308 2.7717 0 1.1481 3 0 0 4 0 0
  [4,16,3.6956,0,1.5308,2.7717,0,1.1481,3,0,0,4,0,0],
// 4 16 2.8284 0 2.8284 2.1213 0 2.1213 2.7717 0 1.1481 3.6956 0 1.5308
  [4,16,2.8284,0,2.8284,2.1213,0,2.1213,2.7717,0,1.1481,3.6956,0,1.5308],
// 4 16 1.5308 0 3.6956 1.1481 0 2.7717 2.1213 0 2.1213 2.8284 0 2.8284
  [4,16,1.5308,0,3.6956,1.1481,0,2.7717,2.1213,0,2.1213,2.8284,0,2.8284],
// 4 16 0 0 4 0 0 3 1.1481 0 2.7717 1.5308 0 3.6956
  [4,16,0,0,4,0,0,3,1.1481,0,2.7717,1.5308,0,3.6956],
// 0
];
module ldraw_lib__4_4ring3(step=0, col=false, unit=2/5, alt=false, line=0.2, solid=!$preview)
    makepoly(ldraw_lib__4_4ring3(solid), step=step, col=col, unit=unit, alt=alt, line=line, solid=solid);
ldraw_lib__4_4ring3(line=0.2);
// file: ../p/4-4edge.scad
use <../lib.scad>
$fa=1; $fs=0.2;
function ldraw_lib__4_4edge(realsolid=false) = [
// 0 Circle 1.0
// 0 Name: 4-4edge.dat
// 0 Author: James Jessiman
// 0 !LDRAW_ORG Primitive UPDATE 2017-01
// 0 !LICENSE Licensed under CC BY 2.0 and CC BY 4.0 : see CAreadme.txt
// 
// 0 BFC CERTIFY CCW
  [0,"BFC","CERTIFY"],
  [0,"BFC","CCW"],
// 
// 0 !HISTORY 1998-12-15 [PTadmin] Official Update 1998-10
// 0 !HISTORY 2005-12-28 [PTadmin] Official Update 2005-01
// 0 !HISTORY 2007-06-24 [PTadmin] Header formatted for Contributor Agreement
// 0 !HISTORY 2008-07-01 [PTadmin] Official Update 2008-01
// 0 !HISTORY 2017-01-15 [Steffen] BFCed
// 0 !HISTORY 2017-12-30 [PTadmin] Official Update 2017-01
// 
// 
// 2 24 1 0 0 0.9239 0 0.3827
  [2,24,1,0,0,0.9239,0,0.3827],
// 2 24 0.9239 0 0.3827 0.7071 0 0.7071
  [2,24,0.9239,0,0.3827,0.7071,0,0.7071],
// 2 24 0.7071 0 0.7071 0.3827 0 0.9239
  [2,24,0.7071,0,0.7071,0.3827,0,0.9239],
// 2 24 0.3827 0 0.9239 0 0 1
  [2,24,0.3827,0,0.9239,0,0,1],
// 2 24 0 0 1 -0.3827 0 0.9239
  [2,24,0,0,1,-0.3827,0,0.9239],
// 2 24 -0.3827 0 0.9239 -0.7071 0 0.7071
  [2,24,-0.3827,0,0.9239,-0.7071,0,0.7071],
// 2 24 -0.7071 0 0.7071 -0.9239 0 0.3827
  [2,24,-0.7071,0,0.7071,-0.9239,0,0.3827],
// 2 24 -0.9239 0 0.3827 -1 0 -0
  [2,24,-0.9239,0,0.3827,-1,0,-0],
// 2 24 -1 0 -0 -0.9239 0 -0.3827
  [2,24,-1,0,-0,-0.9239,0,-0.3827],
// 2 24 -0.9239 0 -0.3827 -0.7071 0 -0.7071
  [2,24,-0.9239,0,-0.3827,-0.7071,0,-0.7071],
// 2 24 -0.7071 0 -0.7071 -0.3827 0 -0.9239
  [2,24,-0.7071,0,-0.7071,-0.3827,0,-0.9239],
// 2 24 -0.3827 0 -0.9239 0 0 -1
  [2,24,-0.3827,0,-0.9239,0,0,-1],
// 2 24 0 0 -1 0.3827 0 -0.9239
  [2,24,0,0,-1,0.3827,0,-0.9239],
// 2 24 0.3827 0 -0.9239 0.7071 0 -0.7071
  [2,24,0.3827,0,-0.9239,0.7071,0,-0.7071],
// 2 24 0.7071 0 -0.7071 0.9239 0 -0.3827
  [2,24,0.7071,0,-0.7071,0.9239,0,-0.3827],
// 2 24 0.9239 0 -0.3827 1 0 0
  [2,24,0.9239,0,-0.3827,1,0,0],
];
module ldraw_lib__4_4edge(step=0, col=false, unit=2/5, alt=false, line=0.2, solid=!$preview)
    makepoly(ldraw_lib__4_4edge(solid), step=step, col=col, unit=unit, alt=alt, line=line, solid=solid);
ldraw_lib__4_4edge(line=0.2);
// file: 3004.scad
use <../lib.scad>
use <s/3004s01.scad>
$fa=1; $fs=0.2;
function ldraw_lib__3004(realsolid=false) = [
// 0 Brick  1 x  2
// 0 Name: 3004.dat
// 0 Author: James Jessiman
// 0 !LDRAW_ORG Part UPDATE 2022-05
// 0 !LICENSE Licensed under CC BY 2.0 and CC BY 4.0 : see CAreadme.txt
// 
// 0 BFC CERTIFY CCW
  [0,"BFC","CERTIFY"],
  [0,"BFC","CCW"],
// 
// 0 !HISTORY 2001-10-26 [PTadmin] Official Update 2001-01
// 0 !HISTORY 2002-05-07 {unknown} BFC Certification
// 0 !HISTORY 2002-06-11 [PTadmin] Official Update 2002-03
// 0 !HISTORY 2007-05-07 [PTadmin] Header formatted for Contributor Agreement
// 0 !HISTORY 2008-07-01 [PTadmin] Official Update 2008-01
// 0 !HISTORY 2022-08-04 [MagFors] Using subfile
// 0 !HISTORY 2022-09-15 [PTadmin] Official Update 2022-05
// 
// 
// 1 16 0 0 0 1 0 0 0 1 0 0 0 1 s\3004s01.dat
  [1,16,0,0,0,1,0,0,0,1,0,0,0,1, ldraw_lib__s__3004s01(realsolid)],
// 4 16 -20 24 -10 20 24 -10 20 0 -10 -20 0 -10
  [4,16,-20,24,-10,20,24,-10,20,0,-10,-20,0,-10],
];
module ldraw_lib__3004(step=0, col=false, unit=2/5, alt=false, line=0.2, solid=!$preview)
    makepoly(ldraw_lib__3004(solid), step=step, col=col, unit=unit, alt=alt, line=line, solid=solid);
ldraw_lib__3004(line=0.2);
// file: 71533k03.scad
use <../lib.scad>
use <../p/4-4cyli.scad>
$fa=1; $fs=0.2;
function ldraw_lib__71533k03(realsolid=false) = [
// 0 ~Technic Pneumatic Tube Segment
// 0 Name: 71533k03.dat
// 0 Author: Jaco van der Molen [Jaco]
// 0 !LDRAW_ORG Part Flexible_Section UPDATE 2020-01
// 0 !LICENSE Licensed under CC BY 2.0 and CC BY 4.0 : see CAreadme.txt
// 
// 0 BFC CERTIFY CW
  [0,"BFC","CERTIFY"],
  [0,"BFC","CW"],
// 
// 0 !HISTORY 2003-11-30 [Steffen] BFCed
// 0 !HISTORY 2009-12-29 [PTadmin] Official Update 2009-03
// 0 !HISTORY 2020-06-27 [PTadmin] Renamed from 166
// 0 !HISTORY 2020-06-28 [PTadmin] Official Update 2020-01
// 
// 
// 1 16 0 0 0 5 0 0 0 1 0 0 0 5 4-4cyli.dat
  [1,16,0,0,0,5,0,0,0,1,0,0,0,5, ldraw_lib__4_4cyli(realsolid)],
// 0 BFC INVERTNEXT
  [0,"BFC","INVERTNEXT"],
// 1 16 0 0 0 3 0 0 0 1 0 0 0 3 4-4cyli.dat
  [1,16,0,0,0,3,0,0,0,1,0,0,0,3, ldraw_lib__4_4cyli(realsolid)],
// 0
];
module ldraw_lib__71533k03(step=0, col=false, unit=2/5, alt=false, line=0.2, solid=!$preview)
    makepoly(ldraw_lib__71533k03(solid), step=step, col=col, unit=unit, alt=alt, line=line, solid=solid);
ldraw_lib__71533k03(line=0.2);
// file: 71533k02.scad
use <../lib.scad>
use <../p/4-4edge.scad>
use <../p/4-4ring3.scad>
use <../p/4-4ring4.scad>
$fa=1; $fs=0.2;
function ldraw_lib__71533k02(realsolid=false) = [
// 0 ~Technic Pneumatic Tube End (Non-Bulged)
// 0 Name: 71533k02.dat
// 0 Author: Steffen [Steffen]
// 0 !LDRAW_ORG Part Flexible_Section UPDATE 2020-01
// 0 !LICENSE Licensed under CC BY 2.0 and CC BY 4.0 : see CAreadme.txt
// 
// 0 BFC CERTIFY CCW
  [0,"BFC","CERTIFY"],
  [0,"BFC","CCW"],
// 
// 0 !HISTORY 2020-06-28 [PTadmin] Official Update 2020-01
// 
// 
// 0 // This file goes together with 71533k01.dat and 71533k03.dat.
// 0 // Those 3 files can be used to create Technic Pneumatic Tubes
// 0 // with either bulged or non-bulged ends.
// 
// 1 16 0 0 0 1 0 0 0 1 0 0 0 1 4-4ring3.dat
  [1,16,0,0,0,1,0,0,0,1,0,0,0,1, ldraw_lib__4_4ring3(realsolid)],
// 1 16 0 0 0 1 0 0 0 1 0 0 0 1 4-4ring4.dat
  [1,16,0,0,0,1,0,0,0,1,0,0,0,1, ldraw_lib__4_4ring4(realsolid)],
// 1 16 0 0 0 3 0 0 0 3 0 0 0 3 4-4edge.dat
  [1,16,0,0,0,3,0,0,0,3,0,0,0,3, ldraw_lib__4_4edge(realsolid)],
// 1 16 0 0 0 5 0 0 0 5 0 0 0 5 4-4edge.dat
  [1,16,0,0,0,5,0,0,0,5,0,0,0,5, ldraw_lib__4_4edge(realsolid)],
];
module ldraw_lib__71533k02(step=0, col=false, unit=2/5, alt=false, line=0.2, solid=!$preview)
    makepoly(ldraw_lib__71533k02(solid), step=step, col=col, unit=unit, alt=alt, line=line, solid=solid);
ldraw_lib__71533k02(line=0.2);
// main file
use <../lib.scad>
use <71533k02.scad>
use <71533k03.scad>
$fa=1; $fs=0.2;
function ldraw_lib__21833_f1(realsolid=false) = [
// 0 Technic Pneumatic Tube 30L
// 0 Name: 21833-f1.dat
// 0 Author: Philippe Hurbain [Philo]
// 0 !LDRAW_ORG Part UPDATE 2020-02
// 0 !LICENSE Licensed under CC BY 2.0 and CC BY 4.0 : see CAreadme.txt
// 
// 0 BFC CERTIFY CCW
  [0,"BFC","CERTIFY"],
  [0,"BFC","CCW"],
// 
// 0 !KEYWORDS 240 mm
// 
// 0 !HISTORY 2020-09-05 [PTadmin] Official Update 2020-02
// 
// 
// 1 16 -300 0 0 0 1 0 1 0 0 0 0 1 71533k02.dat
  [1,16,-300,0,0,0,1,0,1,0,0,0,0,1, ldraw_lib__71533k02(realsolid)],
// 1 16 300 0 0 0 -1 0 -1 0 0 0 0 1 71533k02.dat
  [1,16,300,0,0,0,-1,0,-1,0,0,0,0,1, ldraw_lib__71533k02(realsolid)],
// 1 16 -300 0 0 0 600 0 1 0 0 0 0 1 71533k03.dat
  [1,16,-300,0,0,0,600,0,1,0,0,0,0,1, ldraw_lib__71533k03(realsolid)],
];
module ldraw_lib__21833_f1(step=0, col=false, unit=2/5, alt=false, line=0.2, solid=!$preview)
    makepoly(ldraw_lib__21833_f1(solid), step=step, col=col, unit=unit, alt=alt, line=line, solid=solid);
ldraw_lib__21833_f1(line=0.2);
